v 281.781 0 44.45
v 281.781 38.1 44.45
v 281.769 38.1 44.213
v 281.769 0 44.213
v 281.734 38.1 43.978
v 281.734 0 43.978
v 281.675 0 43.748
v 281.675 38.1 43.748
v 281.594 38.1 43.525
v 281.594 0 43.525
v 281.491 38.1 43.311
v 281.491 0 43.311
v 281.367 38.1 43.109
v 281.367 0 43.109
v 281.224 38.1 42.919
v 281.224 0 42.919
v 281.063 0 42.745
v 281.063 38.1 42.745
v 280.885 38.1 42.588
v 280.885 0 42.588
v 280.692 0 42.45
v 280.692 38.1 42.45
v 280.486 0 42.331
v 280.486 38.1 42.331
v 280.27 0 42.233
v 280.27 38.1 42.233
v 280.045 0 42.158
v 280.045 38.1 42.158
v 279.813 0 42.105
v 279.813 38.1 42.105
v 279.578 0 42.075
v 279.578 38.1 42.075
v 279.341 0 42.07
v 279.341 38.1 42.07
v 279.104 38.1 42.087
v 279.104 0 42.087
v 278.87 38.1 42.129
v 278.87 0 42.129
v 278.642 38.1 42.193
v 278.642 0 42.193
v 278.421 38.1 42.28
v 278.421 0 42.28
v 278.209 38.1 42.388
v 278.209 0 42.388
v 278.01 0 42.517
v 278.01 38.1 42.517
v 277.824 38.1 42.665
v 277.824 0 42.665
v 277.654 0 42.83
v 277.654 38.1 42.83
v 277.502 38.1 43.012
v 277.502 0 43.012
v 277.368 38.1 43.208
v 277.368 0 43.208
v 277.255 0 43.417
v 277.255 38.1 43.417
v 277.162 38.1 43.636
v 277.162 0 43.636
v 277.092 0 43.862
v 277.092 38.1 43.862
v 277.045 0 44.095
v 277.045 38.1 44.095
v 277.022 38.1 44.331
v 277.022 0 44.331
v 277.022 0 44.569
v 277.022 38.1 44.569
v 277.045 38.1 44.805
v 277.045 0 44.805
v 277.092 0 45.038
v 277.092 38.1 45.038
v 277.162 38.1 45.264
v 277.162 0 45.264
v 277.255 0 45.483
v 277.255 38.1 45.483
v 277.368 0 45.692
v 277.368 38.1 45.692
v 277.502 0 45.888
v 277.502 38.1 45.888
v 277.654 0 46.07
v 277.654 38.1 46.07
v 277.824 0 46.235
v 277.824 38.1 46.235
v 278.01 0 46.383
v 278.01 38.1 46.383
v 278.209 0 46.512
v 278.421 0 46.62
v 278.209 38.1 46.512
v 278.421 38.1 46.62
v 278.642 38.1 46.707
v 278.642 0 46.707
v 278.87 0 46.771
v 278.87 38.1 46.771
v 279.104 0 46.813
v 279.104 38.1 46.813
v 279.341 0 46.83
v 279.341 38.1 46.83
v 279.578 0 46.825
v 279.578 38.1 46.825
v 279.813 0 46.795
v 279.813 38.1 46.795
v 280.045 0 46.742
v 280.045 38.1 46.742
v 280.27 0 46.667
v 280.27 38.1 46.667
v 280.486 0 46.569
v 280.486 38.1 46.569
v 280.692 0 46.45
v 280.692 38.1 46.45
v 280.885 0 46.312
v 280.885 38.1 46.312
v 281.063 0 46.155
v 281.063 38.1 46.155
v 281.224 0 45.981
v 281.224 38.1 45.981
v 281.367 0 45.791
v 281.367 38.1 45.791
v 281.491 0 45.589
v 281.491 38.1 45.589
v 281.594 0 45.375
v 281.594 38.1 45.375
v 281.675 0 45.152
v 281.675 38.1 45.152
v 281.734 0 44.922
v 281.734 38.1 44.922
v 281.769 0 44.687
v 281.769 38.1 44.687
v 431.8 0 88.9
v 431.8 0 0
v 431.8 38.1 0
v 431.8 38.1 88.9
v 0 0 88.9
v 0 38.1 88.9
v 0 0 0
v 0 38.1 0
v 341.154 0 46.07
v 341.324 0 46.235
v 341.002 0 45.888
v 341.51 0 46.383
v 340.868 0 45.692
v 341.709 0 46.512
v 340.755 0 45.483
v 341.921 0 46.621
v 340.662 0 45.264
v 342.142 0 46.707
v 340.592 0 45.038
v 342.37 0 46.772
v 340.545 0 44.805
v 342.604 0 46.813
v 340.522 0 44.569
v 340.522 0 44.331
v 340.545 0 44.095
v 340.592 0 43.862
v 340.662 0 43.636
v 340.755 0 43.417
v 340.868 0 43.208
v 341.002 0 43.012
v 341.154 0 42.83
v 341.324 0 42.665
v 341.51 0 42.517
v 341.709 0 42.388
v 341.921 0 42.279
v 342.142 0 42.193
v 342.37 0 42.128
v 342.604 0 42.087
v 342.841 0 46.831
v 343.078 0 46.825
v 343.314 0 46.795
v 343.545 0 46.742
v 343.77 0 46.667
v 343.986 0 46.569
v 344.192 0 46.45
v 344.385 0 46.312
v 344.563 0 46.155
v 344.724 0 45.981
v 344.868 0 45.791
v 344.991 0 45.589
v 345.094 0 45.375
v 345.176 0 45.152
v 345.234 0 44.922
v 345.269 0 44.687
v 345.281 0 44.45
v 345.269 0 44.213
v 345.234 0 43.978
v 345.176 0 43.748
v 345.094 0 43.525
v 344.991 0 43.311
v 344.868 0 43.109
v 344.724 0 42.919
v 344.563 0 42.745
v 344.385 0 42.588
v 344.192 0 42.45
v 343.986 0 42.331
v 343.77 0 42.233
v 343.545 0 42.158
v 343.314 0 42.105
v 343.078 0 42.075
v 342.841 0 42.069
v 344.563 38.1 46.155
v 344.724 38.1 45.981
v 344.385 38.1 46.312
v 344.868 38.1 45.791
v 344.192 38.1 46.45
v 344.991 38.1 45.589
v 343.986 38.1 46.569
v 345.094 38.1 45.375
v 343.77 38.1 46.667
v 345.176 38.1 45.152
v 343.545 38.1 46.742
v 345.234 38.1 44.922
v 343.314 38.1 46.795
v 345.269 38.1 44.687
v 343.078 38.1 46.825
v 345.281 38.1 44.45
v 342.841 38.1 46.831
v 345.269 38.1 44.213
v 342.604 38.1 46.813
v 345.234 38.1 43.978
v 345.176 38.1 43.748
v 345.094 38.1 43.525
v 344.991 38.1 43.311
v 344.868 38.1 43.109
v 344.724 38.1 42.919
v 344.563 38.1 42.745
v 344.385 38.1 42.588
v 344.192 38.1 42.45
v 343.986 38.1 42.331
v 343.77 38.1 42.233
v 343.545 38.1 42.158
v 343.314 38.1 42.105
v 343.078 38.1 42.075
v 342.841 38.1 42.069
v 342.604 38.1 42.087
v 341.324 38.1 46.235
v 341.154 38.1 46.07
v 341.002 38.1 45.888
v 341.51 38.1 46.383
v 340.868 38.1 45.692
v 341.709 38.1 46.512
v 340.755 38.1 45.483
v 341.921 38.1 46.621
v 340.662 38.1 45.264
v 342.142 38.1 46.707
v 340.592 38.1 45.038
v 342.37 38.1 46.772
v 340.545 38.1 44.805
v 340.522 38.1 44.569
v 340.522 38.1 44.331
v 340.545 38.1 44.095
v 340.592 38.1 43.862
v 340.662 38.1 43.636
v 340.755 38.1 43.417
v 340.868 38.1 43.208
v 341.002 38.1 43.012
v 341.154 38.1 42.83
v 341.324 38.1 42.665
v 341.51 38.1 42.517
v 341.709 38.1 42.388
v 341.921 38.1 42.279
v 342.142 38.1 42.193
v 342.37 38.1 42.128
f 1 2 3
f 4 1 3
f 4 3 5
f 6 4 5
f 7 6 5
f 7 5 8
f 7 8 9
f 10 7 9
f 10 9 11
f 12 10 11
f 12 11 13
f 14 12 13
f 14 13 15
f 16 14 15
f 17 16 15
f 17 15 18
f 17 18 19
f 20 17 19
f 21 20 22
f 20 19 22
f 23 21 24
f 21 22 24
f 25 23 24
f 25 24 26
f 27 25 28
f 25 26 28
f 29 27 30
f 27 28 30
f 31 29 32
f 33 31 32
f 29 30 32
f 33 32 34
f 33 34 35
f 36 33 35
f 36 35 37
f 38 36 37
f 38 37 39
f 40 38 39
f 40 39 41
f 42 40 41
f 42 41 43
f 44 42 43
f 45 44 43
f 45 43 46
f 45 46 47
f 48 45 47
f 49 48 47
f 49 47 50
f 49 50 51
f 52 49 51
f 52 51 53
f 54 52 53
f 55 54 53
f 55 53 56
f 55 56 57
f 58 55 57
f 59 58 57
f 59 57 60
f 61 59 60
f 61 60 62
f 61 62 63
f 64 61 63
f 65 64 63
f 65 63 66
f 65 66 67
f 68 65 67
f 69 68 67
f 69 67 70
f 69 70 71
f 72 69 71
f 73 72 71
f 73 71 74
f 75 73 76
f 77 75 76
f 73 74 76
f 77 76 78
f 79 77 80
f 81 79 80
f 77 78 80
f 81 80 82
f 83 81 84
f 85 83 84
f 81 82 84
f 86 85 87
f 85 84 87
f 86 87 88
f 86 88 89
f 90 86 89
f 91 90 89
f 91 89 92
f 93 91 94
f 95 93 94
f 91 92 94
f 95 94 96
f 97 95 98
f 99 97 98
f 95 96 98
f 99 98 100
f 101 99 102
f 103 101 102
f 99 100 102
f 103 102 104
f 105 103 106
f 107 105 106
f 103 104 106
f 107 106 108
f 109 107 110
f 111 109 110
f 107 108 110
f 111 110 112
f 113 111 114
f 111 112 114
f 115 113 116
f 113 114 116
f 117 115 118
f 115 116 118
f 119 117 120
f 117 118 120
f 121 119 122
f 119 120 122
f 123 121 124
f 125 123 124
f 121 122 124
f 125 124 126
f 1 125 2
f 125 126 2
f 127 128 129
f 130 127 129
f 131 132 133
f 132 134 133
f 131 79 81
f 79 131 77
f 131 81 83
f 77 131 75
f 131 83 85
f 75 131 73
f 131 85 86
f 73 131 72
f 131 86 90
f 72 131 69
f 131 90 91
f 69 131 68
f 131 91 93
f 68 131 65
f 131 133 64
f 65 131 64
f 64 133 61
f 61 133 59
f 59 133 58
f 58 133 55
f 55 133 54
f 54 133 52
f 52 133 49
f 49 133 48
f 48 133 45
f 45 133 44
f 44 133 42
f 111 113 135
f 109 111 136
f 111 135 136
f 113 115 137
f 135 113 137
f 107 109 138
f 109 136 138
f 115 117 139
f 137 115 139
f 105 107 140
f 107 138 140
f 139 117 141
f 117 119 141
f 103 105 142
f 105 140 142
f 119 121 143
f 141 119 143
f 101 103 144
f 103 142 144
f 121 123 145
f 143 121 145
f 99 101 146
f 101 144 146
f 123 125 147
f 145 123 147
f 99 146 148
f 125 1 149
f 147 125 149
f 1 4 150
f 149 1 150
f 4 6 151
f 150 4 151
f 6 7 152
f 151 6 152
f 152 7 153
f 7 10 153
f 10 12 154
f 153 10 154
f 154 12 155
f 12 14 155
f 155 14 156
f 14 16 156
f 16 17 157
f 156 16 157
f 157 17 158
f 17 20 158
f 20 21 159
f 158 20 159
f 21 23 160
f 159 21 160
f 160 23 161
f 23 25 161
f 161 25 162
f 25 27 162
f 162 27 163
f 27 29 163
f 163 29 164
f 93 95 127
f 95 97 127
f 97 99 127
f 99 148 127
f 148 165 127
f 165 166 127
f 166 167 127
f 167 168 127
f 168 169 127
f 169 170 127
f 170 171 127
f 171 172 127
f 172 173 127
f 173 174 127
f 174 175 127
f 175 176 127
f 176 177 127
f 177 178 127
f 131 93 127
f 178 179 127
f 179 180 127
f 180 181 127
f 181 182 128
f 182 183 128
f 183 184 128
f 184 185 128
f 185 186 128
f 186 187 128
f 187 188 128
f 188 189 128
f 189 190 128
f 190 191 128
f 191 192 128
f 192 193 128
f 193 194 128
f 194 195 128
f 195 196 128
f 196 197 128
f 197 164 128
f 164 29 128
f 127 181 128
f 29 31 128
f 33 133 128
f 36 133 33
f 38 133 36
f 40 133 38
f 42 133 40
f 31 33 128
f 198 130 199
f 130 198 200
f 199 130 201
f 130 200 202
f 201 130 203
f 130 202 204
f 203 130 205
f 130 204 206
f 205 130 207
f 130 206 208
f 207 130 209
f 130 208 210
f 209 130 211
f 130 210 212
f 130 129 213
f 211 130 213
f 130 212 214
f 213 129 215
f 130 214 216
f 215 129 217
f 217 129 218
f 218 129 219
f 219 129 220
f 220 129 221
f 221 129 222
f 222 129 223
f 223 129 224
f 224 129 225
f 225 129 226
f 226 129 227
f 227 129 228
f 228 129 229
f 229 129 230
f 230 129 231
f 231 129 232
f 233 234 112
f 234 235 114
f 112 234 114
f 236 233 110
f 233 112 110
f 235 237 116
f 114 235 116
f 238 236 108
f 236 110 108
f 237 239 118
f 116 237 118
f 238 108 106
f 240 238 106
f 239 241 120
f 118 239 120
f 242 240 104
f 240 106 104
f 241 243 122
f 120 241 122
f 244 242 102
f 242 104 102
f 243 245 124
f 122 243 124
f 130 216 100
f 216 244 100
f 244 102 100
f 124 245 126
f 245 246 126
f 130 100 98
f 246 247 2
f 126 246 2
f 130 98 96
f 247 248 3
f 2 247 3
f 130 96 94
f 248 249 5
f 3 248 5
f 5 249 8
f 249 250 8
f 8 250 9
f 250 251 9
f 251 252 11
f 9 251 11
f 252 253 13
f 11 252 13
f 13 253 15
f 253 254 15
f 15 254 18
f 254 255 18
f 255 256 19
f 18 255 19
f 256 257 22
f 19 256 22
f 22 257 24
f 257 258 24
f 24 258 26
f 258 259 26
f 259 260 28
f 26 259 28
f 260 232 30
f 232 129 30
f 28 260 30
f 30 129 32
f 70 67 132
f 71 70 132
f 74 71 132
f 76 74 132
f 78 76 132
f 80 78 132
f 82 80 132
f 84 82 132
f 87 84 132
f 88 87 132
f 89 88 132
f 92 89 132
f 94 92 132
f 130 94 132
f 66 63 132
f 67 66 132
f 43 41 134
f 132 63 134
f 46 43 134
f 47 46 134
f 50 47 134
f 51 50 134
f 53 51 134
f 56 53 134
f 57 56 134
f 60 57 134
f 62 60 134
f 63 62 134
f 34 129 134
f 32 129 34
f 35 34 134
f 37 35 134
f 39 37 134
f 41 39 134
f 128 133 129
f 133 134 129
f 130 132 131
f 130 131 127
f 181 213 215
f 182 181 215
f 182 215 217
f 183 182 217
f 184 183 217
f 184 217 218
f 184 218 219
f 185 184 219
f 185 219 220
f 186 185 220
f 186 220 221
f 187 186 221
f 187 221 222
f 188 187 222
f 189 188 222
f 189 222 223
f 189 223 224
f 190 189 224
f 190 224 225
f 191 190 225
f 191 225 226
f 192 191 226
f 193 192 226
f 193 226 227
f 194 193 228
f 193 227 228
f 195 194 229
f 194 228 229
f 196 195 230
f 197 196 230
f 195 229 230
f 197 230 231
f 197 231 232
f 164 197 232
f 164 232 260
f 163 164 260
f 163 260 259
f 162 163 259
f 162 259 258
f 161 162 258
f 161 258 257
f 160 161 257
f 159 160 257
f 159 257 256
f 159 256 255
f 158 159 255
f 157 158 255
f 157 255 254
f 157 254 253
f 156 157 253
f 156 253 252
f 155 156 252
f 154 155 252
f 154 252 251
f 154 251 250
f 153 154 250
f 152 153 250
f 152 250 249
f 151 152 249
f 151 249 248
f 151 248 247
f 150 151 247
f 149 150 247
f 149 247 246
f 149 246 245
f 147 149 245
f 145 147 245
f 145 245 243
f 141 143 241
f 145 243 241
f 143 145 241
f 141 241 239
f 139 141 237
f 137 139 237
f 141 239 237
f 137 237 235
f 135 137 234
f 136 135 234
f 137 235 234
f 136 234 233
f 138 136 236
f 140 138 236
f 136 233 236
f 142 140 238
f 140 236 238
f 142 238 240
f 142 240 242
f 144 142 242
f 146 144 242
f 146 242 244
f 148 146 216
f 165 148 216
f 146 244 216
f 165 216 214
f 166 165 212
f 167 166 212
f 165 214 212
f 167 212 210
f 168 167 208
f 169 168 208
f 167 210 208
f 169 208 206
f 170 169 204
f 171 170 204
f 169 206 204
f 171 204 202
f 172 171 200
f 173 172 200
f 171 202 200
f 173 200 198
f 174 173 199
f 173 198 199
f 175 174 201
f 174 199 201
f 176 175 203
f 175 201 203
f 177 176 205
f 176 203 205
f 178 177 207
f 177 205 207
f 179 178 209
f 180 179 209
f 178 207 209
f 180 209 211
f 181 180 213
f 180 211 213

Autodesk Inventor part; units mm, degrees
ref_plane "YZ Plane" through (0, 0, 0) normal (1, 0, 0) x (0, 1, 0)
ref_plane "XZ Plane" through (0, 0, 0) normal (0, 1, 0) x (-1, 0, 0)
ref_plane "XY Plane" through (0, 0, 0) normal (0, 0, 1) x (1, 0, 0)
sketch "Sketch1" plane through (0, 0, 0) normal (0, 0, 1) x (1, 0, 0)
  line L0 (0, 0) -> (431.8, 0)
  line L1 (431.8, 0) -> (431.8, 38.1)
  line L2 (431.8, 38.1) -> (0, 38.1)
  line L3 (0, 38.1) -> (0, 0)
  dimension "d0" = 431.8
  dimension "d1" = 38.1
extrude "Extrusion1" add sketch "Sketch1" along normal blind 88.9
sketch "Sketch4" plane through (0, 38.1, 0) normal (0, 1, 0) x (1, 0, 0)
  circle A0 centre (279.4, -44.45) radius 2.3812
  circle A1 centre (342.9, -44.45) radius 2.3813
  line L0 (279.4, -44.45) -> (342.9, -44.45) construction
  line L1 (431.8, 0) -> (431.8, -88.9) projected
  line L2 (266.7, 0) -> (355.6, 0) construction
  line L3 (355.6, 0) -> (355.6, -88.9) construction
  line L4 (355.6, -88.9) -> (266.7, -88.9) construction
  line L5 (266.7, -88.9) -> (266.7, 0) construction
  line L6 (431.8, 0) -> (0, 0) projected
  line L7 (431.8, -88.9) -> (0, -88.9) projected
  point P0 (311.15, -44.45)
  point P1 (311.15, 0)
  point P2 (266.7, -44.45)
  point P3 (311.15, -88.9)
  dimension "d11" = 4.7625
  dimension "d12" = 4.7625
  dimension "d13" = 63.5
  dimension "d15" = 88.9
  dimension "d16" = 76.2
extrude "Extrusion3" cut sketch "Sketch4" against normal through all
properties part number "BA02" material "Wood (Oak)"
